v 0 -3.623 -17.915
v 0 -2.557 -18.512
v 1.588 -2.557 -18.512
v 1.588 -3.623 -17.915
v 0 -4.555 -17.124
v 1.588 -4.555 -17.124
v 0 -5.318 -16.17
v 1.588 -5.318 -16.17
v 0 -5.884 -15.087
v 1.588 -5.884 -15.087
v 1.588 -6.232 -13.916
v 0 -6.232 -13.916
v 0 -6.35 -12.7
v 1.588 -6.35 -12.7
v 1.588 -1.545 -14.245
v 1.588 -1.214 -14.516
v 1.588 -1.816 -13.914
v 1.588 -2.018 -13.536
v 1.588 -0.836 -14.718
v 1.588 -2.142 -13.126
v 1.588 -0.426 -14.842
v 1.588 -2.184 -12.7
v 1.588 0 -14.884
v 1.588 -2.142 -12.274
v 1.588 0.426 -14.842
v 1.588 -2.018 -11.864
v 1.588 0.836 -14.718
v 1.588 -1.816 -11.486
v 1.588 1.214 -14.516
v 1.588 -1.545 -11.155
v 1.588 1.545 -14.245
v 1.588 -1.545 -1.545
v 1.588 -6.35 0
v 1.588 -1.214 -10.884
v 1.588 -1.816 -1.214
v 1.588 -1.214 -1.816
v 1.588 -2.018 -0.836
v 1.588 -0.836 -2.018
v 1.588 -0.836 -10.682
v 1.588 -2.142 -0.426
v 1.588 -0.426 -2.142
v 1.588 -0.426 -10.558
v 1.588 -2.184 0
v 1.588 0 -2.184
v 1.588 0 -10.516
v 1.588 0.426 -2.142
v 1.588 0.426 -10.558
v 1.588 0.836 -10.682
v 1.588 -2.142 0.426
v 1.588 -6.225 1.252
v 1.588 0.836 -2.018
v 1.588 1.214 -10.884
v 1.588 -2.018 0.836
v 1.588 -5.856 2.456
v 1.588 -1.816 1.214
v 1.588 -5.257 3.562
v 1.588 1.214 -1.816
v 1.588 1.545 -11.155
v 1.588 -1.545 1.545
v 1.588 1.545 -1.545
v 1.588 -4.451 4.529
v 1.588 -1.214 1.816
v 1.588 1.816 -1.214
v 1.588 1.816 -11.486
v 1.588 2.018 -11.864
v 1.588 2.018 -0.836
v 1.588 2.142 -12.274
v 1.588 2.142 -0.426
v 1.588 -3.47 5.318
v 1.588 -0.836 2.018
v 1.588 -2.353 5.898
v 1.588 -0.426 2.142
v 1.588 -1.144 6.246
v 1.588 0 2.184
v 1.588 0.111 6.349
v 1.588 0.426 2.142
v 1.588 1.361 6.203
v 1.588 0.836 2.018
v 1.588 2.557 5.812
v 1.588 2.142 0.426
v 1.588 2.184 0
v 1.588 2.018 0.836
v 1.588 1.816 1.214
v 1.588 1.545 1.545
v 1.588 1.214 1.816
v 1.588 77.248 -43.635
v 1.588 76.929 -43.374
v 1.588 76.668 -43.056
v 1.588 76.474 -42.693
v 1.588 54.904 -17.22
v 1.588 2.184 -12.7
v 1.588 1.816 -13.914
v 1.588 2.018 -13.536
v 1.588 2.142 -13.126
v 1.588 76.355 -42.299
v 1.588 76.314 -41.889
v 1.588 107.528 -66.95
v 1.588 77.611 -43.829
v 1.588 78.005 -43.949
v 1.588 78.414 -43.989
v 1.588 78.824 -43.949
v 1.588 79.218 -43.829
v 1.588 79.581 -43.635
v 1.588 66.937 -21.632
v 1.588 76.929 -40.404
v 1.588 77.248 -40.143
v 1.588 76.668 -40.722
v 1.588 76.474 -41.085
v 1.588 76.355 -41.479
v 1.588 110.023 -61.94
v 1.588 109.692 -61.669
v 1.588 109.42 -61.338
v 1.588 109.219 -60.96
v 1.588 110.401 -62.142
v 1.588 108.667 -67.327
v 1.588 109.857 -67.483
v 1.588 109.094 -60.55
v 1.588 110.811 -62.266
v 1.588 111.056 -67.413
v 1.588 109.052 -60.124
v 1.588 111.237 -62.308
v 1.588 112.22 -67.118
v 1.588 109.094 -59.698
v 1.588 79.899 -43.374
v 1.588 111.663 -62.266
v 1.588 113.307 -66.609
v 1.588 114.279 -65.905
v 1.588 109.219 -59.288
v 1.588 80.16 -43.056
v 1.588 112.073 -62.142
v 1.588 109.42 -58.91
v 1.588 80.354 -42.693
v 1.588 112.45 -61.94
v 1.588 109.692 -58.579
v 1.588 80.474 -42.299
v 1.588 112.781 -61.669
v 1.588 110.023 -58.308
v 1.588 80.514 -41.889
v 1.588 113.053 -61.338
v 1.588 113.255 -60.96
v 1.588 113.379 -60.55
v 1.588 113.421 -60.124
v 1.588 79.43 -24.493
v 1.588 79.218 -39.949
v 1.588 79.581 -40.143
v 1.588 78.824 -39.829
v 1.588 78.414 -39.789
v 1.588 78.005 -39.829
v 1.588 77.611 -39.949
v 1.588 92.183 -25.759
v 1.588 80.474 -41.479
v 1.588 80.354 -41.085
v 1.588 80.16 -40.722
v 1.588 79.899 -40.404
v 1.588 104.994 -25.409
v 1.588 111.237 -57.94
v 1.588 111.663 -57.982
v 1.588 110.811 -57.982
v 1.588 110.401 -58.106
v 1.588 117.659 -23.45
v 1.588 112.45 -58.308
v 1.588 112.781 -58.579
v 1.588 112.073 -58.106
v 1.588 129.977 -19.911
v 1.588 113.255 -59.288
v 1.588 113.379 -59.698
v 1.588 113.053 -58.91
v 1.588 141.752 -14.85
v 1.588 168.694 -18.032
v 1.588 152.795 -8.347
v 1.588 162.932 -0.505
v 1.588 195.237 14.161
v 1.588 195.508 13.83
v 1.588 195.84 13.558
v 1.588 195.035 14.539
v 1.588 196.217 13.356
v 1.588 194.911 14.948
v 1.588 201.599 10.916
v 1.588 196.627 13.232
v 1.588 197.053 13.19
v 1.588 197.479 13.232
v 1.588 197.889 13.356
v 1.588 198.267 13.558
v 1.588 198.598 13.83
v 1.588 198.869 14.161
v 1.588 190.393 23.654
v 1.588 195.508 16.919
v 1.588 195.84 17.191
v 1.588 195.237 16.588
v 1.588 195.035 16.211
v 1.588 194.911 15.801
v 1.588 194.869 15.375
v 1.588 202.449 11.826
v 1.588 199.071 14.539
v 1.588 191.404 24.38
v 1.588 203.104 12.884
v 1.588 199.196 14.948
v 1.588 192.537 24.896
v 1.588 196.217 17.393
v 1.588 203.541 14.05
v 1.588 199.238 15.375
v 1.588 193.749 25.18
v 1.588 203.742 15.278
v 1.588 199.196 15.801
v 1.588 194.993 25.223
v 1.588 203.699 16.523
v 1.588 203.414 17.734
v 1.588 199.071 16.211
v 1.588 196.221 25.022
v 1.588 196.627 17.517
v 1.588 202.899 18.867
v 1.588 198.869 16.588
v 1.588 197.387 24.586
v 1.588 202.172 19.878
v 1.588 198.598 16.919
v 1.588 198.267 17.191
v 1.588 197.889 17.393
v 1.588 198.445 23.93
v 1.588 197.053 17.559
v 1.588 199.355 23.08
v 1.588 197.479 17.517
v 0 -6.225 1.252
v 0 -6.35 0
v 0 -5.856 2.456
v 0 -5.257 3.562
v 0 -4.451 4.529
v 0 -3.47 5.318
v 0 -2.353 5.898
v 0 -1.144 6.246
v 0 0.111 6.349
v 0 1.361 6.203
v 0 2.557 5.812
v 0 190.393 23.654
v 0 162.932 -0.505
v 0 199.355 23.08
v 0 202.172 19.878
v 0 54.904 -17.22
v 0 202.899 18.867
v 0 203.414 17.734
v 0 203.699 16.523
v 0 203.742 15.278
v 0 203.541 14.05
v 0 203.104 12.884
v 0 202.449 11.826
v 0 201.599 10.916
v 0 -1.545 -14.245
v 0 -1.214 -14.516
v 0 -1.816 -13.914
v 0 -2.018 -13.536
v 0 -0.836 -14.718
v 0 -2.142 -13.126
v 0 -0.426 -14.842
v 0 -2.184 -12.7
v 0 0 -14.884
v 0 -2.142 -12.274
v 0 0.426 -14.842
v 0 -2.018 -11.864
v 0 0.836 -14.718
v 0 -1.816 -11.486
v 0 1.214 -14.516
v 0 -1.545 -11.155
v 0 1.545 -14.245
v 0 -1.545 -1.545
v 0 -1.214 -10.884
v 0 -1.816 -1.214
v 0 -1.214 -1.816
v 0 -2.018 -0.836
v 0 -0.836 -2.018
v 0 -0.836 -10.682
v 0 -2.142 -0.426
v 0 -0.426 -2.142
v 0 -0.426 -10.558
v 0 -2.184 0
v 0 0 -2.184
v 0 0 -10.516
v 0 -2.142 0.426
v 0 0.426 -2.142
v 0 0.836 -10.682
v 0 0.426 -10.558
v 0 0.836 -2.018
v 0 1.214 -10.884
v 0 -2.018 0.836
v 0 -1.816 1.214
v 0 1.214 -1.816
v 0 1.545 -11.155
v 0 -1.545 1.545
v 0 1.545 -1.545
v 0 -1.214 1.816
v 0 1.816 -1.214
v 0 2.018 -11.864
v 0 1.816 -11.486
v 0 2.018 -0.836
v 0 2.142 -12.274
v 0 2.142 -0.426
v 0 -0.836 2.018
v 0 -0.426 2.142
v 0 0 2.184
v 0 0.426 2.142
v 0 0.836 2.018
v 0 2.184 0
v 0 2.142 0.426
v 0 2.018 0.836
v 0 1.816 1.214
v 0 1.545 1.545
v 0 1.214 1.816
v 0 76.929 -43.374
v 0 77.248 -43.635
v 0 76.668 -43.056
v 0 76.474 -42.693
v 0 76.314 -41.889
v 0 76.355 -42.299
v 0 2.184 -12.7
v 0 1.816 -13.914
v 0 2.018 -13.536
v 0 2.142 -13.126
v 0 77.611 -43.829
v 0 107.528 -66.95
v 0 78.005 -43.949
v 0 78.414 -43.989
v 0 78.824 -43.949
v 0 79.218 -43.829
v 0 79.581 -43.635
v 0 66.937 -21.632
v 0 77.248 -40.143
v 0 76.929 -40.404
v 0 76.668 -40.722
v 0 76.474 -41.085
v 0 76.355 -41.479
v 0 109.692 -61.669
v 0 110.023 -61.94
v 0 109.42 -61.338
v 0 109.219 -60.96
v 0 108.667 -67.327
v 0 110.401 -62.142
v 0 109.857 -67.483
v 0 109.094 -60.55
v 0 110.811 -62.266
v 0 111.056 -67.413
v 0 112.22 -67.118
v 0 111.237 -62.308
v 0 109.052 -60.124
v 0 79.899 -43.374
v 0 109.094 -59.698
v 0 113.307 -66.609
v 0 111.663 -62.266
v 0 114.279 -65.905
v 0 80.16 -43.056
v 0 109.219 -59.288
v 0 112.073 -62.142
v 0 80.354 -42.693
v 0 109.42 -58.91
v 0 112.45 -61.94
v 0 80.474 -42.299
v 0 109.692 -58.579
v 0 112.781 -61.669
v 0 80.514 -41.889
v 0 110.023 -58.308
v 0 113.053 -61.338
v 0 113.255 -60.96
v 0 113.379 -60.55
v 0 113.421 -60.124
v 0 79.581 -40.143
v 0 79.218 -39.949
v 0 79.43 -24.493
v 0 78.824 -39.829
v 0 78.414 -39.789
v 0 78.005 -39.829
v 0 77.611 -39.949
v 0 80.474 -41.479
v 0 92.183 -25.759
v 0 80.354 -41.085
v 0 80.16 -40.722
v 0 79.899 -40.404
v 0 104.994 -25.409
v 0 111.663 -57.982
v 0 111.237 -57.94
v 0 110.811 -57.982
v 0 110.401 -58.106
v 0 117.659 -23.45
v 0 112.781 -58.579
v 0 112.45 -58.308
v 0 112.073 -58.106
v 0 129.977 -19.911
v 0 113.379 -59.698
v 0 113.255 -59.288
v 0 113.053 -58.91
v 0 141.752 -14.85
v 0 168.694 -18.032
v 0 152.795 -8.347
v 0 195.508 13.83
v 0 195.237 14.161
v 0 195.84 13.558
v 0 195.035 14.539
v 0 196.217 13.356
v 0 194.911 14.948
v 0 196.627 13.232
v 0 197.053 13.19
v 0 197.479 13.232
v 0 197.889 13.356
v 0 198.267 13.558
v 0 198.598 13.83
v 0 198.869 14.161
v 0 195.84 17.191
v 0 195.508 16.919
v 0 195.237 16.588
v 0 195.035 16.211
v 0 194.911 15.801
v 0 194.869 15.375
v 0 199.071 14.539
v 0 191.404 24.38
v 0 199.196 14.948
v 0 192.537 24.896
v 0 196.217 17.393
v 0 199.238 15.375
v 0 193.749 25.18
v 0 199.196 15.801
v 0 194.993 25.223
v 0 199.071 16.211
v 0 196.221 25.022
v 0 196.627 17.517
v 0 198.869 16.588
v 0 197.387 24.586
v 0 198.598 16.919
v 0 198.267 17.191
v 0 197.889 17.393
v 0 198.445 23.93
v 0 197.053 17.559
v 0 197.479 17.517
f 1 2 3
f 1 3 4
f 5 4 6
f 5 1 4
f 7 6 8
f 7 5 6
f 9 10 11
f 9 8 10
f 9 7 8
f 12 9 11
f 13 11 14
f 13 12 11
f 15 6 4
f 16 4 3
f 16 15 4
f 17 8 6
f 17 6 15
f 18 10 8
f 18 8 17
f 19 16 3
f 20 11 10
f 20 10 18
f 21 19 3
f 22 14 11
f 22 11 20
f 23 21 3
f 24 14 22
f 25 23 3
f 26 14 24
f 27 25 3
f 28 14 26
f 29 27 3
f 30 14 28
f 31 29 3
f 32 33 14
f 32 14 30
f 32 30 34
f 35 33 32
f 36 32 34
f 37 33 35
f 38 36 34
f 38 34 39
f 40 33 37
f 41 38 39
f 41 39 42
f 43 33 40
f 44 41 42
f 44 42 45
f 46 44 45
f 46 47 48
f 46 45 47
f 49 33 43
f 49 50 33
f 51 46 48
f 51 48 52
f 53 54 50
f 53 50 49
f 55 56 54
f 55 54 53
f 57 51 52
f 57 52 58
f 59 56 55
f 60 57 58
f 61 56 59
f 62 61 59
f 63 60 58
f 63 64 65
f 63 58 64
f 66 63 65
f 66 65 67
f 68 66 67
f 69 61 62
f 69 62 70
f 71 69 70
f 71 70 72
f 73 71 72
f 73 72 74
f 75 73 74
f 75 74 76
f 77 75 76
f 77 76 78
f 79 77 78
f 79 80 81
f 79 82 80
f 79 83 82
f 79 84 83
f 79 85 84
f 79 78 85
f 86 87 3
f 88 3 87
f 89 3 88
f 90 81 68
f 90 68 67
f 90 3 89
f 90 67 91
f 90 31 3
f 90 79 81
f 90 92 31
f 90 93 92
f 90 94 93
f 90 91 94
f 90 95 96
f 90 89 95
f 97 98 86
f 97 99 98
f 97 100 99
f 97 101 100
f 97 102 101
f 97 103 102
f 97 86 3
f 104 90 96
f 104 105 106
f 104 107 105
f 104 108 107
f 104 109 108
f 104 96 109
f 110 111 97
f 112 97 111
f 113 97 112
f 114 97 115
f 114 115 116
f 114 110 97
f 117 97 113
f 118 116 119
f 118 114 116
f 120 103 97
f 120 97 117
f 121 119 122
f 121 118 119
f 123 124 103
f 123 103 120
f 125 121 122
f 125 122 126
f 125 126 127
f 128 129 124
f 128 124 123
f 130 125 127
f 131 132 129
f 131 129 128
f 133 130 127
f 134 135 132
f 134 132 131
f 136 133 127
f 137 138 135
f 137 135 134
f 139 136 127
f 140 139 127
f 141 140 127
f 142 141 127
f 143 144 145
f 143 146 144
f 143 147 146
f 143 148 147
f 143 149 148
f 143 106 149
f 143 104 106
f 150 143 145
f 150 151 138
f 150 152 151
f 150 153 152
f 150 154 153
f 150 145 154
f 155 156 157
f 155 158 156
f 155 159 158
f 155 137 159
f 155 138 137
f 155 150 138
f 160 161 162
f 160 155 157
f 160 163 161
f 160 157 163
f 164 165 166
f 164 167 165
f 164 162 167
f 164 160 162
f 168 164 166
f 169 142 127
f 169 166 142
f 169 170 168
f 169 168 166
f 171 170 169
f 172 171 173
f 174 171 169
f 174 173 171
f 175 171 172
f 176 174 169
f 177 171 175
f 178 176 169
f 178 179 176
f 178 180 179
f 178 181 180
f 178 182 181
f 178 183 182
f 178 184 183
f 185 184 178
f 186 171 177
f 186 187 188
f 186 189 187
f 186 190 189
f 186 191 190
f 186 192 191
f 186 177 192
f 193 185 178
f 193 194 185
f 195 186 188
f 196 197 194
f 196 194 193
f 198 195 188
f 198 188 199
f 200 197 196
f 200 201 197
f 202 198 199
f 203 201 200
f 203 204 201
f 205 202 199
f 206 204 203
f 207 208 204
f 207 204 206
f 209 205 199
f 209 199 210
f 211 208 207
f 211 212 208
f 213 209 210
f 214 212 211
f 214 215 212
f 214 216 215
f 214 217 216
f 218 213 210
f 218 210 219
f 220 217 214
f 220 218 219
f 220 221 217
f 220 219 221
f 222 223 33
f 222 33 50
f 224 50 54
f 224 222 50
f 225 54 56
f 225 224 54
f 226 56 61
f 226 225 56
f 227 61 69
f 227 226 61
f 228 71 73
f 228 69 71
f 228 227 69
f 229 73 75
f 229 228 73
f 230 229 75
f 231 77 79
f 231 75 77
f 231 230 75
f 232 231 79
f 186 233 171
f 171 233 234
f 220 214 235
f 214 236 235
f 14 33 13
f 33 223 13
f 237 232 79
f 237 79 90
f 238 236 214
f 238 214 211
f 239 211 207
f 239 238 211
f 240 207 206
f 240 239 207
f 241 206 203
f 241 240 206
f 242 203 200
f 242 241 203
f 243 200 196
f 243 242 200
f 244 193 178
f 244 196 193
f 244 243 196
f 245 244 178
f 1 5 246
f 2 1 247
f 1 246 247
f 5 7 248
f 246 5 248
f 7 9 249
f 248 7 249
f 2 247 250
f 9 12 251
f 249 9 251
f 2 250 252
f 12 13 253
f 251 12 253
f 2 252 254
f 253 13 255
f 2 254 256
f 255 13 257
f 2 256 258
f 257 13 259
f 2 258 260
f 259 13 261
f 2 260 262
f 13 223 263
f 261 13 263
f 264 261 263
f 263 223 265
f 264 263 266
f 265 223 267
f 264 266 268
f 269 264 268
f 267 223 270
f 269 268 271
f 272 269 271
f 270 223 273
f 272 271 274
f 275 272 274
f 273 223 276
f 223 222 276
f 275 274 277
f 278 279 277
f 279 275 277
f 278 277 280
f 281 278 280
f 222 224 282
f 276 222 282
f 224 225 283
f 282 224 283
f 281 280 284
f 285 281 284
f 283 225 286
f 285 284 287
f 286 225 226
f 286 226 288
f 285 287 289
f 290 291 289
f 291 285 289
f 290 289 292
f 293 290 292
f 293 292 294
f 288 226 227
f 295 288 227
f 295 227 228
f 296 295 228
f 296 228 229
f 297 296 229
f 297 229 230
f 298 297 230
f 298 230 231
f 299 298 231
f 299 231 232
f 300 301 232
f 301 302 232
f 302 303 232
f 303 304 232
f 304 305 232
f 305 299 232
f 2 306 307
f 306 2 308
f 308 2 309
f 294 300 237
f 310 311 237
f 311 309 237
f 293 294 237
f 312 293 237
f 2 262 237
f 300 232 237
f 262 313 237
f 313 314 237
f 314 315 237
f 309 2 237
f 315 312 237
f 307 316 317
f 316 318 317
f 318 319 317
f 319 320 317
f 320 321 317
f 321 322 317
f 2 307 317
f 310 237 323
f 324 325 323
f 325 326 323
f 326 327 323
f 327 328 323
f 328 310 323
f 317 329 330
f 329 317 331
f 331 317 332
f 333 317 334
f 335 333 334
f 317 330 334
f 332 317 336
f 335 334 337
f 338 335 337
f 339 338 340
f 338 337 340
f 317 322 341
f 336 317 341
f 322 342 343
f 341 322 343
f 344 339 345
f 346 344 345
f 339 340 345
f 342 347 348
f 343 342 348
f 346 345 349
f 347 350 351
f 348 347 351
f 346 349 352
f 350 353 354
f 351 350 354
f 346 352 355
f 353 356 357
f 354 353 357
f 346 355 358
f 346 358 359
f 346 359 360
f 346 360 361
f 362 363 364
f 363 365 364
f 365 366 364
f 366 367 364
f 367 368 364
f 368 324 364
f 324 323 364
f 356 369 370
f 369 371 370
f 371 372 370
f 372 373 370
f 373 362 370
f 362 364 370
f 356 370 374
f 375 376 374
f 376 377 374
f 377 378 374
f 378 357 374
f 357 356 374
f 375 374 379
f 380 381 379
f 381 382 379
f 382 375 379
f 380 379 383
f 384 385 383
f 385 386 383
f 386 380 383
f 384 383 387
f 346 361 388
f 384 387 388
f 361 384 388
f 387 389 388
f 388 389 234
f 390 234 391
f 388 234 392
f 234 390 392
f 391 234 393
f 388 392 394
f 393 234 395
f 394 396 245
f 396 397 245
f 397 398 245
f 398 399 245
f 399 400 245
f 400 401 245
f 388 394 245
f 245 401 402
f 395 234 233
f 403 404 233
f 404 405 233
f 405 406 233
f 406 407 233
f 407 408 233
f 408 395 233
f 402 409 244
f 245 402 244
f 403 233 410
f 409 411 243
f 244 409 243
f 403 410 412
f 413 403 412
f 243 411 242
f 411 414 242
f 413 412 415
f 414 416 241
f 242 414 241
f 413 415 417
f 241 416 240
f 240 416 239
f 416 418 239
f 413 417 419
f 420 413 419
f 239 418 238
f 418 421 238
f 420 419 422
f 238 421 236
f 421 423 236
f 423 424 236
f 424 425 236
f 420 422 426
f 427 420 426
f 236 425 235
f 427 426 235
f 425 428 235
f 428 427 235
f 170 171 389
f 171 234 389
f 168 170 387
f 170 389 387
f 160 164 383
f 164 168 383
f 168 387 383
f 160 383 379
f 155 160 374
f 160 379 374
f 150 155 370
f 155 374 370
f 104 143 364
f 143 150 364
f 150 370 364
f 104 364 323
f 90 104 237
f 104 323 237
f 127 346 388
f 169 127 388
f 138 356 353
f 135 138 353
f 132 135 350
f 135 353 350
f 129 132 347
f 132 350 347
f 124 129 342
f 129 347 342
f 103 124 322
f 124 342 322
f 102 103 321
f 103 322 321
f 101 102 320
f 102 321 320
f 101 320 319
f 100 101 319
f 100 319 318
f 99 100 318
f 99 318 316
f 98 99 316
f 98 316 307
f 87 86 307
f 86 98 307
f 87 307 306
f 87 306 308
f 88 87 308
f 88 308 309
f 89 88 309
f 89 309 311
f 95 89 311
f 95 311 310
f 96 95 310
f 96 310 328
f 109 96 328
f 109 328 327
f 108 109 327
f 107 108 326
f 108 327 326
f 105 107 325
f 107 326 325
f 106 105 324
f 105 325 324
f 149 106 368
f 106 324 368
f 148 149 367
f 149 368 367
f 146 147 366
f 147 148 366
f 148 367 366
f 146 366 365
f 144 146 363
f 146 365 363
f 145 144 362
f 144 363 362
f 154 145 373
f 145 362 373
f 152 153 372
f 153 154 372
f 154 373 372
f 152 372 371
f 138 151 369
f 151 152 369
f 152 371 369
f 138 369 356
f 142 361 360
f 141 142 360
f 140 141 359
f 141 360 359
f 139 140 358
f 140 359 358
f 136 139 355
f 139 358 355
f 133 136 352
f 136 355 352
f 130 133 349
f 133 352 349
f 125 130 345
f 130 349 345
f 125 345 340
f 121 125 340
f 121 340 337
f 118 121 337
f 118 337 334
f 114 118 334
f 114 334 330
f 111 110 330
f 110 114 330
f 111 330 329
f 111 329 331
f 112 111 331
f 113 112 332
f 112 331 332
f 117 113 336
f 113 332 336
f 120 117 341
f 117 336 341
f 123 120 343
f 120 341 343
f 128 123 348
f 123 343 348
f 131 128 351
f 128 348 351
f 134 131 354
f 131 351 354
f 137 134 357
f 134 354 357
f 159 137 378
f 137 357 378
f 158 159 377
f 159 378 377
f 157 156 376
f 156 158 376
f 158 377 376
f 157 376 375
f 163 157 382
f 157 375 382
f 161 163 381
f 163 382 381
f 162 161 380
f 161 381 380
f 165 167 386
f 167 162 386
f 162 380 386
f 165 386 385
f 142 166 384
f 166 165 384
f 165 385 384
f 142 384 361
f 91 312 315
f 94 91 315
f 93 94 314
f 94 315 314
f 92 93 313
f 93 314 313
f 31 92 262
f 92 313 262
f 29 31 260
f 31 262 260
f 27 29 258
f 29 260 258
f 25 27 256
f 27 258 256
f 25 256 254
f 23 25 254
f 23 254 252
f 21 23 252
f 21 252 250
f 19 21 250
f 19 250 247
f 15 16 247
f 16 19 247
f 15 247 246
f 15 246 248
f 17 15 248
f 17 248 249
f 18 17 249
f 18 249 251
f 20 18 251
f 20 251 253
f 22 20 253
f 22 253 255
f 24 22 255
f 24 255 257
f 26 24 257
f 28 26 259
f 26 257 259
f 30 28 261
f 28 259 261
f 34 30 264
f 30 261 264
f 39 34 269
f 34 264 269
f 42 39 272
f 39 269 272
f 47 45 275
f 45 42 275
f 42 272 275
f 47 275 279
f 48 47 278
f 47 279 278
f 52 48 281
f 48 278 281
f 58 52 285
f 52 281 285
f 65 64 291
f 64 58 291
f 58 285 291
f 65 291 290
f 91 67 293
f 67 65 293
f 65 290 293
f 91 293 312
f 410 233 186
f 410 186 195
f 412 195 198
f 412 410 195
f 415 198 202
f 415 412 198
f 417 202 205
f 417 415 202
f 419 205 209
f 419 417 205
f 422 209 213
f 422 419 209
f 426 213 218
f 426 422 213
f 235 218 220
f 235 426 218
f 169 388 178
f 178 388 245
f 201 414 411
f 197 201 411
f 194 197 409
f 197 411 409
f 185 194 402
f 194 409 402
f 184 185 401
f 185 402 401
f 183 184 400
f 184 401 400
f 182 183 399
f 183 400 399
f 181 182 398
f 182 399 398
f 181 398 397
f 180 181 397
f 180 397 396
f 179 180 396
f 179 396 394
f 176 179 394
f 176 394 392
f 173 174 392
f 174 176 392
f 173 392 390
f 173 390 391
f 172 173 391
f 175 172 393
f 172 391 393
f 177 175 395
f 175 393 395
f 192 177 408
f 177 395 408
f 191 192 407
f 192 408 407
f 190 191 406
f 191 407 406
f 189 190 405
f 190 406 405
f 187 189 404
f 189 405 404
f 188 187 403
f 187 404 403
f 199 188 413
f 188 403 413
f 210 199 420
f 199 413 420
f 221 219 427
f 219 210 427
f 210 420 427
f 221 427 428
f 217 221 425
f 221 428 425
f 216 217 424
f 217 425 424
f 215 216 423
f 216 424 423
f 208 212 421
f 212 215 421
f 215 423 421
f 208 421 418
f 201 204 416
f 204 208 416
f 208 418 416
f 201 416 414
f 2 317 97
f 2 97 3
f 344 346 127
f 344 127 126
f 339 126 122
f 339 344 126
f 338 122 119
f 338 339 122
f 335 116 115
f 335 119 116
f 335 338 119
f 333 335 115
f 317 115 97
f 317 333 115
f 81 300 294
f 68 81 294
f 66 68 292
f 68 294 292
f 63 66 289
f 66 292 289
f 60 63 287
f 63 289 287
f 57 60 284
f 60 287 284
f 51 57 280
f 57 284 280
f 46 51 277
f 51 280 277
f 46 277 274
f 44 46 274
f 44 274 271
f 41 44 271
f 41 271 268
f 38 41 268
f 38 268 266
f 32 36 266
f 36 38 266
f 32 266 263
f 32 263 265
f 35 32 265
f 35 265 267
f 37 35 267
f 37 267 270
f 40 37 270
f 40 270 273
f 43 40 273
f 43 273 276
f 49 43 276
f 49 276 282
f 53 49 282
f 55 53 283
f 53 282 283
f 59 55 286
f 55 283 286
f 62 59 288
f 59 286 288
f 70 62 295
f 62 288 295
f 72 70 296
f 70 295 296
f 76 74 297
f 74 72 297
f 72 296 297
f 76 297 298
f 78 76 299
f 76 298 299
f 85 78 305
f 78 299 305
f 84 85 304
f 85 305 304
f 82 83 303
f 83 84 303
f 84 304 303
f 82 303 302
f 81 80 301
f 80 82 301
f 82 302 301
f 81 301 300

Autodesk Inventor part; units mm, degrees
ref_plane "YZ Plane" through (0, 0, 0) normal (1, 0, 0) x (0, 1, 0)
ref_plane "XZ Plane" through (0, 0, 0) normal (0, 1, 0) x (-1, 0, 0)
ref_plane "XY Plane" through (0, 0, 0) normal (0, 0, 1) x (1, 0, 0)
sketch "main" plane through (0, 0, 0) normal (0, 0, 1) x (1, 0, 0)
  circle A0 centre (-11.2144, -104.2473) radius 2.1844
  circle A1 centre (1.4856, -104.2473) radius 2.1844
  circle A2 centre (48.9096, 6.9894) radius 2.1844
  circle A3 centre (-26.5889, 92.8058) radius 2.1844
  arc A4 (1.4856, -110.5973) -> (7.2979, -106.8047) centre (1.4856, -104.2473) ccw
  arc A5 (-17.0266, -101.6899) -> (-11.2144, -110.5973) centre (-11.2144, -104.2473) ccw
  line L0 (54.6905, 10.0319) -> (-22.1306, 97.3516)
  line L1 (55.7352, 3.2802) -> (7.2979, -106.8047)
  line L2 (-31.0925, 97.9248) -> (-34.2947, 95.1076)
  line L3 (-33.7837, 110.5973) -> (6.8178, 64.4472)
  line L4 (-17.0266, -101.6899) -> (6.006, -49.3432)
  line L5 (-34.8679, 86.1457) -> (-10.7088, 58.6849)
  arc A6 (-34.2947, 95.1076) -> (-34.8679, 86.1457) centre (-30.1004, 90.34) ccw
  arc A7 (-22.1306, 97.3516) -> (-31.0925, 97.9248) centre (-26.8981, 93.1573) ccw
  arc A8 (55.7352, 3.2802) -> (54.6905, 10.0319) centre (49.923, 5.8376) ccw
  arc A9 (6.006, -49.3432) -> (-10.7088, 58.6849) centre (-86.9901, -8.425) ccw
  line L6 (-11.2144, -110.5973) -> (1.4856, -110.5973)
  point P0 (16.4228, 13.0791)
  point P1 (-26.3249, 102.1192)
  point P2 (49.8339, -10.1318)
  dimension "d9" = 6.35
  dimension "d10" = 6.35
  dimension "d11" = 101.6
sketch "Sketch1" plane through (0, 0, 0) normal (1, 0, 0) x (0, 1, 0)
  circle A0 centre (78.4143, -41.889) radius 2.1 projected
  circle A1 centre (0, 0) radius 2.1844
  circle A2 centre (0, -12.7) radius 2.1844
  circle A3 centre (111.2367, -60.124) radius 2.1844
  circle A4 centre (197.0531, 15.3746) radius 2.1844
  arc A5 (-6.35, -12.7) -> (-2.5574, -18.5123) centre (0, -12.7) ccw
  arc A6 (2.5574, 5.8123) -> (-6.35, 0) centre (0, 0) ccw
  line L0 (114.2793, -65.9049) -> (201.599, 10.9162)
  line L1 (107.5275, -66.9496) -> (-2.5574, -18.5123)
  line L2 (202.1722, 19.8781) -> (199.3549, 23.0804)
  line L3 (214.8446, 22.5693) -> (168.6945, -18.0321)
  line L4 (2.5574, 5.8123) -> (54.9042, -17.2203)
  line L5 (190.393, 23.6536) -> (162.9322, -0.5055)
  arc A7 (199.3549, 23.0804) -> (190.393, 23.6536) centre (194.5874, 18.886) ccw
  arc A8 (201.599, 10.9162) -> (202.1722, 19.8781) centre (197.4046, 15.6838) ccw
  arc A9 (107.5275, -66.9496) -> (114.2793, -65.9049) centre (110.0849, -61.1373) ccw
  arc A10 (54.9042, -17.2203) -> (162.9322, -0.5055) centre (95.8224, 75.7757) ccw
  line L6 (-6.35, 0) -> (-6.35, -12.7)
  point P0 (0, 0)
extrude "Extrusion1" add sketch "Sketch1" along normal blind 1.5875
properties part number "Support Gusset" material "Acetal Resin, White"
